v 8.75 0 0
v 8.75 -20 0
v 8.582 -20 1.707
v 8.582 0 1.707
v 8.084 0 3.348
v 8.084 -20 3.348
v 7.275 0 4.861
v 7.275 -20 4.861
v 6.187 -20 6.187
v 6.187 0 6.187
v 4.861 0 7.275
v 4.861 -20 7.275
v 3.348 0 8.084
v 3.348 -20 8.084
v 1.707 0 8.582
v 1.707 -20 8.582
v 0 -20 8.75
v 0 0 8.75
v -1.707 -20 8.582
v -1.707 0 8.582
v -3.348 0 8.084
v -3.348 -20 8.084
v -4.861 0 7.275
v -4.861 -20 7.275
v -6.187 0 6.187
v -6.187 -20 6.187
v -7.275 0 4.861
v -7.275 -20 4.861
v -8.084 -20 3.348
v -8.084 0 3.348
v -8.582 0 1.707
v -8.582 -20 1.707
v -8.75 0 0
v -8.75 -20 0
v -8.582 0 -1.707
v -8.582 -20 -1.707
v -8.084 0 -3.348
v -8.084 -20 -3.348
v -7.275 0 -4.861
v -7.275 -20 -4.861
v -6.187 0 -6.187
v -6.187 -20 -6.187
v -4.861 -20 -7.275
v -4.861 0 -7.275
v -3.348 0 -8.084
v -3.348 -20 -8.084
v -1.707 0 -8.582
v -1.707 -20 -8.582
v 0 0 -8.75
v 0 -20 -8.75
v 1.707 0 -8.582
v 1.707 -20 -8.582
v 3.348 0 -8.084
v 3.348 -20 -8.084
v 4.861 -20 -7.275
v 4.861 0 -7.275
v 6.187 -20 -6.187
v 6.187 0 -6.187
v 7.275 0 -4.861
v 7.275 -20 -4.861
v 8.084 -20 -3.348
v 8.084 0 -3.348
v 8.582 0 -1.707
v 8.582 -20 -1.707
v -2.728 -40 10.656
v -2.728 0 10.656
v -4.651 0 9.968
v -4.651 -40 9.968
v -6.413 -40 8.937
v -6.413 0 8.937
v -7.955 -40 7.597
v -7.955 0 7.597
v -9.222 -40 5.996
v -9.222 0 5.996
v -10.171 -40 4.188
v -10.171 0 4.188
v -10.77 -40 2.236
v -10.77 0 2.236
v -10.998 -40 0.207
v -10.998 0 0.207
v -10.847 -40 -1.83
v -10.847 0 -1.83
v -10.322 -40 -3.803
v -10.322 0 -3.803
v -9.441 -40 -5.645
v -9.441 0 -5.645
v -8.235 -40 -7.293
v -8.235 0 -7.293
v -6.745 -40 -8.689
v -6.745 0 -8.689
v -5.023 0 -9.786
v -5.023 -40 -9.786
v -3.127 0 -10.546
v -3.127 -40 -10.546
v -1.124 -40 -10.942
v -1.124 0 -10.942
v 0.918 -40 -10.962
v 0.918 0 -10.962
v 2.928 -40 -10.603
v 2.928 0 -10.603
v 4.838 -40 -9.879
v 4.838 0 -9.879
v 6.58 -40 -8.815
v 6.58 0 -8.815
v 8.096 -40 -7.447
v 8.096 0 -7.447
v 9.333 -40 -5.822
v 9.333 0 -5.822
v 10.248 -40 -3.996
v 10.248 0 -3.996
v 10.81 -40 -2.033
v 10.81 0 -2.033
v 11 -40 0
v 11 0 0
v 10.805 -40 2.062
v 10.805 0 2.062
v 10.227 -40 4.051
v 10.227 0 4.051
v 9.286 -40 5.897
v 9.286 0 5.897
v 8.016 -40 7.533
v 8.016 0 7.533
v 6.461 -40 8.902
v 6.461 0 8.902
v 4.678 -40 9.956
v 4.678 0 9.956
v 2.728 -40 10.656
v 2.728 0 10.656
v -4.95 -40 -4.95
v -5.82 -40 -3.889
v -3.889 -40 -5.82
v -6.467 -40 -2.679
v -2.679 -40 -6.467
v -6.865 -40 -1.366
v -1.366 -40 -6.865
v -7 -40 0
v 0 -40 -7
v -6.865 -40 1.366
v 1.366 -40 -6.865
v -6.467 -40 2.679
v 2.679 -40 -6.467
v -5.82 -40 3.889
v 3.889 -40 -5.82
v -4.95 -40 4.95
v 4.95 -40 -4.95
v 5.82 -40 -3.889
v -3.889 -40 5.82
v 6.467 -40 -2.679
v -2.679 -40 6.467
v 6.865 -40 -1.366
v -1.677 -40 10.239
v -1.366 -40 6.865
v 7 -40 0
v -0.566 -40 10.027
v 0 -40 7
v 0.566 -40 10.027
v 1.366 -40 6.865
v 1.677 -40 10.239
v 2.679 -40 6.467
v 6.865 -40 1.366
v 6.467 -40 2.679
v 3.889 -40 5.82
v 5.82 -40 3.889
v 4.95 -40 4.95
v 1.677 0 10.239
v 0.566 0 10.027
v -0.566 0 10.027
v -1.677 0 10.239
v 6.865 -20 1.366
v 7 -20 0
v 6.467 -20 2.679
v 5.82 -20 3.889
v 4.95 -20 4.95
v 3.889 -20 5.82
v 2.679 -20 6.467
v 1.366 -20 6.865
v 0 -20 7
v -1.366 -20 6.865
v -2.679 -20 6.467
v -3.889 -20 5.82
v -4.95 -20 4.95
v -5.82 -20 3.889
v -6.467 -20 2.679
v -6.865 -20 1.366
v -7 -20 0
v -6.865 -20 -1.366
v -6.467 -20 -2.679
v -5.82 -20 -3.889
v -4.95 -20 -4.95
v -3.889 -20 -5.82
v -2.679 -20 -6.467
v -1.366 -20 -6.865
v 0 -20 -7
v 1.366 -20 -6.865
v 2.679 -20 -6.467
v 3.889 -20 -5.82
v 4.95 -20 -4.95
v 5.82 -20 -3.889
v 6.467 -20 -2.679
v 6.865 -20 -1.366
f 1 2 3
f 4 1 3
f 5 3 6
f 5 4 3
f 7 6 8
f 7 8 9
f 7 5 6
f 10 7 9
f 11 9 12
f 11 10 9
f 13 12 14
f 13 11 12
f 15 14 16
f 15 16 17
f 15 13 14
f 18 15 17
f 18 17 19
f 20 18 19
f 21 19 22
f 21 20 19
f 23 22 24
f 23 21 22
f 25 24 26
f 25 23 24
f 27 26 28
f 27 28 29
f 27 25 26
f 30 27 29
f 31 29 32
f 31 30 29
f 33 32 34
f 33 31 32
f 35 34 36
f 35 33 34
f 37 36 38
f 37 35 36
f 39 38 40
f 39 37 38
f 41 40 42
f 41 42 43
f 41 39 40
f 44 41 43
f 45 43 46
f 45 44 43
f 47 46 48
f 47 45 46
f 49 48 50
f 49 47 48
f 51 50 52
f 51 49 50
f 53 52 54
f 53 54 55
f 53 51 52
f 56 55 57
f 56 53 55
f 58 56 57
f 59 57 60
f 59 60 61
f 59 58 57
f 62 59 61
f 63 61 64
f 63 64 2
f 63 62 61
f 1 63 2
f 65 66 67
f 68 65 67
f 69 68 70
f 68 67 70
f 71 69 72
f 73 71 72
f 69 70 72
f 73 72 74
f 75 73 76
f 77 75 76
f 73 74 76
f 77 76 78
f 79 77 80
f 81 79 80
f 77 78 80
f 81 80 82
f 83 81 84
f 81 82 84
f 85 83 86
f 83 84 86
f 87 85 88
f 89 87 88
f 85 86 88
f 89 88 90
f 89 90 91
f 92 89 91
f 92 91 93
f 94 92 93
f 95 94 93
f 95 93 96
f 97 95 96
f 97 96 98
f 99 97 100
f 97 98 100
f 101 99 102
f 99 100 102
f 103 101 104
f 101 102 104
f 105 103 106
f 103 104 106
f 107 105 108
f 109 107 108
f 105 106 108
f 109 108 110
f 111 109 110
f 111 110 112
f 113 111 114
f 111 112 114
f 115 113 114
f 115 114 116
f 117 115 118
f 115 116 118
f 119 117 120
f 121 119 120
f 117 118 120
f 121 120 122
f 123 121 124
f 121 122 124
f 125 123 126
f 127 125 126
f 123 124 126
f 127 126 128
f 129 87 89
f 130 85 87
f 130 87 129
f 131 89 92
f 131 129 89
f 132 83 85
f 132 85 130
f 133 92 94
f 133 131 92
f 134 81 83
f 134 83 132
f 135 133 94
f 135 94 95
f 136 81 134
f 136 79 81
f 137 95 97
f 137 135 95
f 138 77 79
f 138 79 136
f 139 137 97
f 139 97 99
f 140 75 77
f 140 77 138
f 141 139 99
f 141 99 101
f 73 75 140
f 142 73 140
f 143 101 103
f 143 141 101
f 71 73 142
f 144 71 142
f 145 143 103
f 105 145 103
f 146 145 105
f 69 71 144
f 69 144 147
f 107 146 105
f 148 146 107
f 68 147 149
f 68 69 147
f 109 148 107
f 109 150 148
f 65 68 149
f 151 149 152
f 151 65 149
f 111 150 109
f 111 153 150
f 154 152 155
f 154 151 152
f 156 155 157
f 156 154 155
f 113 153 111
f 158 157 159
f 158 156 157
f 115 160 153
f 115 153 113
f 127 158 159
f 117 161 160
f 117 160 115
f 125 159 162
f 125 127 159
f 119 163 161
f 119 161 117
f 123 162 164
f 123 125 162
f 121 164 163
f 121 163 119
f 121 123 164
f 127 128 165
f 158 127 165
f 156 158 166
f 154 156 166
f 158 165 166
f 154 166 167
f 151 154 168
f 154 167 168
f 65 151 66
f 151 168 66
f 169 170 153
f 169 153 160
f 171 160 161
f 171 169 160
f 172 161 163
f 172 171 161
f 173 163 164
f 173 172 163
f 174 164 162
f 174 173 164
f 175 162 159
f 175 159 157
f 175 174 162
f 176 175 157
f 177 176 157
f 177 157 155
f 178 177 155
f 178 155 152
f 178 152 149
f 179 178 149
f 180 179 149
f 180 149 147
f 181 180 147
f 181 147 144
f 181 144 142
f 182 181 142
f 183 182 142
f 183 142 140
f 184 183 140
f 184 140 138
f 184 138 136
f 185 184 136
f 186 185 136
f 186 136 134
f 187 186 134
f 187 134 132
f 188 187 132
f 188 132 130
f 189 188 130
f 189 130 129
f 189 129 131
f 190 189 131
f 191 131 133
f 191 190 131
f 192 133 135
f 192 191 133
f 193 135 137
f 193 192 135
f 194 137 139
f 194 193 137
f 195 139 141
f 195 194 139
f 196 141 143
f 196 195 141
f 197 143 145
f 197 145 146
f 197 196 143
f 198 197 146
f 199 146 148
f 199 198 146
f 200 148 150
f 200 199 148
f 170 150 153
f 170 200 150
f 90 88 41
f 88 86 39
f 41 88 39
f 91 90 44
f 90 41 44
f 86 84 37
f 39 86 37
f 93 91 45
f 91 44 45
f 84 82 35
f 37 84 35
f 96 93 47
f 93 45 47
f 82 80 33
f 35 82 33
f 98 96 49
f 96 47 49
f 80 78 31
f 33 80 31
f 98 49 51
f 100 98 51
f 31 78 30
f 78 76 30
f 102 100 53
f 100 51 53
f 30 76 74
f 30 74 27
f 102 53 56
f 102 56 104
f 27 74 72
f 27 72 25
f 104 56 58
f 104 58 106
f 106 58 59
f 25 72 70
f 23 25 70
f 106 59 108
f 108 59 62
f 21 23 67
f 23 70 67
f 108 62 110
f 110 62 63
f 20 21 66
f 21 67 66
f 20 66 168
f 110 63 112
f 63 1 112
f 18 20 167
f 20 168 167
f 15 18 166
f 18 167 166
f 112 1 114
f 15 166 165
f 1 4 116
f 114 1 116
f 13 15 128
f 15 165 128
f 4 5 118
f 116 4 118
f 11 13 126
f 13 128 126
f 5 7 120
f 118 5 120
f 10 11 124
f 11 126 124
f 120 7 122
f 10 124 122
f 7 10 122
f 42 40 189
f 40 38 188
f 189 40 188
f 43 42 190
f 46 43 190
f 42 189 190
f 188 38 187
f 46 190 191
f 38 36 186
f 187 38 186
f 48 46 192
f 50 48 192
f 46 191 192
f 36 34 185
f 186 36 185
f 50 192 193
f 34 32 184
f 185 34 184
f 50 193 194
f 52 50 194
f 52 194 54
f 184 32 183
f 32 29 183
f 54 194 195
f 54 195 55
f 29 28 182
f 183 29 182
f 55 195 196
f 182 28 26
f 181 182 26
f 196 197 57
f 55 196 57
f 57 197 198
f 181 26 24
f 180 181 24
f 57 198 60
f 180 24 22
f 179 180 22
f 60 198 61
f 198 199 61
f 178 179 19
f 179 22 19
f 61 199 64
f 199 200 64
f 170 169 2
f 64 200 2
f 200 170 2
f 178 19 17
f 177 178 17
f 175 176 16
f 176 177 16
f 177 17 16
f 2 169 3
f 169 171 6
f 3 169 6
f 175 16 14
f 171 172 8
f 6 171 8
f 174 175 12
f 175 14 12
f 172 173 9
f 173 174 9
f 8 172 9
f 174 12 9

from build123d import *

# Parameters (mm, degrees)
F0_R     = 8.75
F0_R_2   = 7
F1_DEPTH = 40
F2_DEPTH = 20


with BuildPart() as f1:
    # F0 (on Front) → F1 (new body)
    with BuildSketch(Plane.XZ):
        with BuildLine():
            ThreePointArc((-2.728431, 10.65625), (-6.744897, -8.68944), (11, 0))
            ThreePointArc((11, 0), (8.68944, 6.744897), (2.728431, 10.65625))
            ThreePointArc((2.728431, 10.65625), (0, 10), (-2.728431, 10.65625))
        make_face()
        Circle(F0_R, mode=Mode.SUBTRACT)
        Circle(F0_R)
        Circle(F0_R_2, mode=Mode.SUBTRACT)
    extrude(amount=F1_DEPTH)

    # F0 (on Front) → F2 (cut)
    with BuildSketch(Plane.XZ):
        Circle(F0_R)
        Circle(F0_R_2, mode=Mode.SUBTRACT)
    extrude(amount=F2_DEPTH, mode=Mode.SUBTRACT)


solid = f1.part
